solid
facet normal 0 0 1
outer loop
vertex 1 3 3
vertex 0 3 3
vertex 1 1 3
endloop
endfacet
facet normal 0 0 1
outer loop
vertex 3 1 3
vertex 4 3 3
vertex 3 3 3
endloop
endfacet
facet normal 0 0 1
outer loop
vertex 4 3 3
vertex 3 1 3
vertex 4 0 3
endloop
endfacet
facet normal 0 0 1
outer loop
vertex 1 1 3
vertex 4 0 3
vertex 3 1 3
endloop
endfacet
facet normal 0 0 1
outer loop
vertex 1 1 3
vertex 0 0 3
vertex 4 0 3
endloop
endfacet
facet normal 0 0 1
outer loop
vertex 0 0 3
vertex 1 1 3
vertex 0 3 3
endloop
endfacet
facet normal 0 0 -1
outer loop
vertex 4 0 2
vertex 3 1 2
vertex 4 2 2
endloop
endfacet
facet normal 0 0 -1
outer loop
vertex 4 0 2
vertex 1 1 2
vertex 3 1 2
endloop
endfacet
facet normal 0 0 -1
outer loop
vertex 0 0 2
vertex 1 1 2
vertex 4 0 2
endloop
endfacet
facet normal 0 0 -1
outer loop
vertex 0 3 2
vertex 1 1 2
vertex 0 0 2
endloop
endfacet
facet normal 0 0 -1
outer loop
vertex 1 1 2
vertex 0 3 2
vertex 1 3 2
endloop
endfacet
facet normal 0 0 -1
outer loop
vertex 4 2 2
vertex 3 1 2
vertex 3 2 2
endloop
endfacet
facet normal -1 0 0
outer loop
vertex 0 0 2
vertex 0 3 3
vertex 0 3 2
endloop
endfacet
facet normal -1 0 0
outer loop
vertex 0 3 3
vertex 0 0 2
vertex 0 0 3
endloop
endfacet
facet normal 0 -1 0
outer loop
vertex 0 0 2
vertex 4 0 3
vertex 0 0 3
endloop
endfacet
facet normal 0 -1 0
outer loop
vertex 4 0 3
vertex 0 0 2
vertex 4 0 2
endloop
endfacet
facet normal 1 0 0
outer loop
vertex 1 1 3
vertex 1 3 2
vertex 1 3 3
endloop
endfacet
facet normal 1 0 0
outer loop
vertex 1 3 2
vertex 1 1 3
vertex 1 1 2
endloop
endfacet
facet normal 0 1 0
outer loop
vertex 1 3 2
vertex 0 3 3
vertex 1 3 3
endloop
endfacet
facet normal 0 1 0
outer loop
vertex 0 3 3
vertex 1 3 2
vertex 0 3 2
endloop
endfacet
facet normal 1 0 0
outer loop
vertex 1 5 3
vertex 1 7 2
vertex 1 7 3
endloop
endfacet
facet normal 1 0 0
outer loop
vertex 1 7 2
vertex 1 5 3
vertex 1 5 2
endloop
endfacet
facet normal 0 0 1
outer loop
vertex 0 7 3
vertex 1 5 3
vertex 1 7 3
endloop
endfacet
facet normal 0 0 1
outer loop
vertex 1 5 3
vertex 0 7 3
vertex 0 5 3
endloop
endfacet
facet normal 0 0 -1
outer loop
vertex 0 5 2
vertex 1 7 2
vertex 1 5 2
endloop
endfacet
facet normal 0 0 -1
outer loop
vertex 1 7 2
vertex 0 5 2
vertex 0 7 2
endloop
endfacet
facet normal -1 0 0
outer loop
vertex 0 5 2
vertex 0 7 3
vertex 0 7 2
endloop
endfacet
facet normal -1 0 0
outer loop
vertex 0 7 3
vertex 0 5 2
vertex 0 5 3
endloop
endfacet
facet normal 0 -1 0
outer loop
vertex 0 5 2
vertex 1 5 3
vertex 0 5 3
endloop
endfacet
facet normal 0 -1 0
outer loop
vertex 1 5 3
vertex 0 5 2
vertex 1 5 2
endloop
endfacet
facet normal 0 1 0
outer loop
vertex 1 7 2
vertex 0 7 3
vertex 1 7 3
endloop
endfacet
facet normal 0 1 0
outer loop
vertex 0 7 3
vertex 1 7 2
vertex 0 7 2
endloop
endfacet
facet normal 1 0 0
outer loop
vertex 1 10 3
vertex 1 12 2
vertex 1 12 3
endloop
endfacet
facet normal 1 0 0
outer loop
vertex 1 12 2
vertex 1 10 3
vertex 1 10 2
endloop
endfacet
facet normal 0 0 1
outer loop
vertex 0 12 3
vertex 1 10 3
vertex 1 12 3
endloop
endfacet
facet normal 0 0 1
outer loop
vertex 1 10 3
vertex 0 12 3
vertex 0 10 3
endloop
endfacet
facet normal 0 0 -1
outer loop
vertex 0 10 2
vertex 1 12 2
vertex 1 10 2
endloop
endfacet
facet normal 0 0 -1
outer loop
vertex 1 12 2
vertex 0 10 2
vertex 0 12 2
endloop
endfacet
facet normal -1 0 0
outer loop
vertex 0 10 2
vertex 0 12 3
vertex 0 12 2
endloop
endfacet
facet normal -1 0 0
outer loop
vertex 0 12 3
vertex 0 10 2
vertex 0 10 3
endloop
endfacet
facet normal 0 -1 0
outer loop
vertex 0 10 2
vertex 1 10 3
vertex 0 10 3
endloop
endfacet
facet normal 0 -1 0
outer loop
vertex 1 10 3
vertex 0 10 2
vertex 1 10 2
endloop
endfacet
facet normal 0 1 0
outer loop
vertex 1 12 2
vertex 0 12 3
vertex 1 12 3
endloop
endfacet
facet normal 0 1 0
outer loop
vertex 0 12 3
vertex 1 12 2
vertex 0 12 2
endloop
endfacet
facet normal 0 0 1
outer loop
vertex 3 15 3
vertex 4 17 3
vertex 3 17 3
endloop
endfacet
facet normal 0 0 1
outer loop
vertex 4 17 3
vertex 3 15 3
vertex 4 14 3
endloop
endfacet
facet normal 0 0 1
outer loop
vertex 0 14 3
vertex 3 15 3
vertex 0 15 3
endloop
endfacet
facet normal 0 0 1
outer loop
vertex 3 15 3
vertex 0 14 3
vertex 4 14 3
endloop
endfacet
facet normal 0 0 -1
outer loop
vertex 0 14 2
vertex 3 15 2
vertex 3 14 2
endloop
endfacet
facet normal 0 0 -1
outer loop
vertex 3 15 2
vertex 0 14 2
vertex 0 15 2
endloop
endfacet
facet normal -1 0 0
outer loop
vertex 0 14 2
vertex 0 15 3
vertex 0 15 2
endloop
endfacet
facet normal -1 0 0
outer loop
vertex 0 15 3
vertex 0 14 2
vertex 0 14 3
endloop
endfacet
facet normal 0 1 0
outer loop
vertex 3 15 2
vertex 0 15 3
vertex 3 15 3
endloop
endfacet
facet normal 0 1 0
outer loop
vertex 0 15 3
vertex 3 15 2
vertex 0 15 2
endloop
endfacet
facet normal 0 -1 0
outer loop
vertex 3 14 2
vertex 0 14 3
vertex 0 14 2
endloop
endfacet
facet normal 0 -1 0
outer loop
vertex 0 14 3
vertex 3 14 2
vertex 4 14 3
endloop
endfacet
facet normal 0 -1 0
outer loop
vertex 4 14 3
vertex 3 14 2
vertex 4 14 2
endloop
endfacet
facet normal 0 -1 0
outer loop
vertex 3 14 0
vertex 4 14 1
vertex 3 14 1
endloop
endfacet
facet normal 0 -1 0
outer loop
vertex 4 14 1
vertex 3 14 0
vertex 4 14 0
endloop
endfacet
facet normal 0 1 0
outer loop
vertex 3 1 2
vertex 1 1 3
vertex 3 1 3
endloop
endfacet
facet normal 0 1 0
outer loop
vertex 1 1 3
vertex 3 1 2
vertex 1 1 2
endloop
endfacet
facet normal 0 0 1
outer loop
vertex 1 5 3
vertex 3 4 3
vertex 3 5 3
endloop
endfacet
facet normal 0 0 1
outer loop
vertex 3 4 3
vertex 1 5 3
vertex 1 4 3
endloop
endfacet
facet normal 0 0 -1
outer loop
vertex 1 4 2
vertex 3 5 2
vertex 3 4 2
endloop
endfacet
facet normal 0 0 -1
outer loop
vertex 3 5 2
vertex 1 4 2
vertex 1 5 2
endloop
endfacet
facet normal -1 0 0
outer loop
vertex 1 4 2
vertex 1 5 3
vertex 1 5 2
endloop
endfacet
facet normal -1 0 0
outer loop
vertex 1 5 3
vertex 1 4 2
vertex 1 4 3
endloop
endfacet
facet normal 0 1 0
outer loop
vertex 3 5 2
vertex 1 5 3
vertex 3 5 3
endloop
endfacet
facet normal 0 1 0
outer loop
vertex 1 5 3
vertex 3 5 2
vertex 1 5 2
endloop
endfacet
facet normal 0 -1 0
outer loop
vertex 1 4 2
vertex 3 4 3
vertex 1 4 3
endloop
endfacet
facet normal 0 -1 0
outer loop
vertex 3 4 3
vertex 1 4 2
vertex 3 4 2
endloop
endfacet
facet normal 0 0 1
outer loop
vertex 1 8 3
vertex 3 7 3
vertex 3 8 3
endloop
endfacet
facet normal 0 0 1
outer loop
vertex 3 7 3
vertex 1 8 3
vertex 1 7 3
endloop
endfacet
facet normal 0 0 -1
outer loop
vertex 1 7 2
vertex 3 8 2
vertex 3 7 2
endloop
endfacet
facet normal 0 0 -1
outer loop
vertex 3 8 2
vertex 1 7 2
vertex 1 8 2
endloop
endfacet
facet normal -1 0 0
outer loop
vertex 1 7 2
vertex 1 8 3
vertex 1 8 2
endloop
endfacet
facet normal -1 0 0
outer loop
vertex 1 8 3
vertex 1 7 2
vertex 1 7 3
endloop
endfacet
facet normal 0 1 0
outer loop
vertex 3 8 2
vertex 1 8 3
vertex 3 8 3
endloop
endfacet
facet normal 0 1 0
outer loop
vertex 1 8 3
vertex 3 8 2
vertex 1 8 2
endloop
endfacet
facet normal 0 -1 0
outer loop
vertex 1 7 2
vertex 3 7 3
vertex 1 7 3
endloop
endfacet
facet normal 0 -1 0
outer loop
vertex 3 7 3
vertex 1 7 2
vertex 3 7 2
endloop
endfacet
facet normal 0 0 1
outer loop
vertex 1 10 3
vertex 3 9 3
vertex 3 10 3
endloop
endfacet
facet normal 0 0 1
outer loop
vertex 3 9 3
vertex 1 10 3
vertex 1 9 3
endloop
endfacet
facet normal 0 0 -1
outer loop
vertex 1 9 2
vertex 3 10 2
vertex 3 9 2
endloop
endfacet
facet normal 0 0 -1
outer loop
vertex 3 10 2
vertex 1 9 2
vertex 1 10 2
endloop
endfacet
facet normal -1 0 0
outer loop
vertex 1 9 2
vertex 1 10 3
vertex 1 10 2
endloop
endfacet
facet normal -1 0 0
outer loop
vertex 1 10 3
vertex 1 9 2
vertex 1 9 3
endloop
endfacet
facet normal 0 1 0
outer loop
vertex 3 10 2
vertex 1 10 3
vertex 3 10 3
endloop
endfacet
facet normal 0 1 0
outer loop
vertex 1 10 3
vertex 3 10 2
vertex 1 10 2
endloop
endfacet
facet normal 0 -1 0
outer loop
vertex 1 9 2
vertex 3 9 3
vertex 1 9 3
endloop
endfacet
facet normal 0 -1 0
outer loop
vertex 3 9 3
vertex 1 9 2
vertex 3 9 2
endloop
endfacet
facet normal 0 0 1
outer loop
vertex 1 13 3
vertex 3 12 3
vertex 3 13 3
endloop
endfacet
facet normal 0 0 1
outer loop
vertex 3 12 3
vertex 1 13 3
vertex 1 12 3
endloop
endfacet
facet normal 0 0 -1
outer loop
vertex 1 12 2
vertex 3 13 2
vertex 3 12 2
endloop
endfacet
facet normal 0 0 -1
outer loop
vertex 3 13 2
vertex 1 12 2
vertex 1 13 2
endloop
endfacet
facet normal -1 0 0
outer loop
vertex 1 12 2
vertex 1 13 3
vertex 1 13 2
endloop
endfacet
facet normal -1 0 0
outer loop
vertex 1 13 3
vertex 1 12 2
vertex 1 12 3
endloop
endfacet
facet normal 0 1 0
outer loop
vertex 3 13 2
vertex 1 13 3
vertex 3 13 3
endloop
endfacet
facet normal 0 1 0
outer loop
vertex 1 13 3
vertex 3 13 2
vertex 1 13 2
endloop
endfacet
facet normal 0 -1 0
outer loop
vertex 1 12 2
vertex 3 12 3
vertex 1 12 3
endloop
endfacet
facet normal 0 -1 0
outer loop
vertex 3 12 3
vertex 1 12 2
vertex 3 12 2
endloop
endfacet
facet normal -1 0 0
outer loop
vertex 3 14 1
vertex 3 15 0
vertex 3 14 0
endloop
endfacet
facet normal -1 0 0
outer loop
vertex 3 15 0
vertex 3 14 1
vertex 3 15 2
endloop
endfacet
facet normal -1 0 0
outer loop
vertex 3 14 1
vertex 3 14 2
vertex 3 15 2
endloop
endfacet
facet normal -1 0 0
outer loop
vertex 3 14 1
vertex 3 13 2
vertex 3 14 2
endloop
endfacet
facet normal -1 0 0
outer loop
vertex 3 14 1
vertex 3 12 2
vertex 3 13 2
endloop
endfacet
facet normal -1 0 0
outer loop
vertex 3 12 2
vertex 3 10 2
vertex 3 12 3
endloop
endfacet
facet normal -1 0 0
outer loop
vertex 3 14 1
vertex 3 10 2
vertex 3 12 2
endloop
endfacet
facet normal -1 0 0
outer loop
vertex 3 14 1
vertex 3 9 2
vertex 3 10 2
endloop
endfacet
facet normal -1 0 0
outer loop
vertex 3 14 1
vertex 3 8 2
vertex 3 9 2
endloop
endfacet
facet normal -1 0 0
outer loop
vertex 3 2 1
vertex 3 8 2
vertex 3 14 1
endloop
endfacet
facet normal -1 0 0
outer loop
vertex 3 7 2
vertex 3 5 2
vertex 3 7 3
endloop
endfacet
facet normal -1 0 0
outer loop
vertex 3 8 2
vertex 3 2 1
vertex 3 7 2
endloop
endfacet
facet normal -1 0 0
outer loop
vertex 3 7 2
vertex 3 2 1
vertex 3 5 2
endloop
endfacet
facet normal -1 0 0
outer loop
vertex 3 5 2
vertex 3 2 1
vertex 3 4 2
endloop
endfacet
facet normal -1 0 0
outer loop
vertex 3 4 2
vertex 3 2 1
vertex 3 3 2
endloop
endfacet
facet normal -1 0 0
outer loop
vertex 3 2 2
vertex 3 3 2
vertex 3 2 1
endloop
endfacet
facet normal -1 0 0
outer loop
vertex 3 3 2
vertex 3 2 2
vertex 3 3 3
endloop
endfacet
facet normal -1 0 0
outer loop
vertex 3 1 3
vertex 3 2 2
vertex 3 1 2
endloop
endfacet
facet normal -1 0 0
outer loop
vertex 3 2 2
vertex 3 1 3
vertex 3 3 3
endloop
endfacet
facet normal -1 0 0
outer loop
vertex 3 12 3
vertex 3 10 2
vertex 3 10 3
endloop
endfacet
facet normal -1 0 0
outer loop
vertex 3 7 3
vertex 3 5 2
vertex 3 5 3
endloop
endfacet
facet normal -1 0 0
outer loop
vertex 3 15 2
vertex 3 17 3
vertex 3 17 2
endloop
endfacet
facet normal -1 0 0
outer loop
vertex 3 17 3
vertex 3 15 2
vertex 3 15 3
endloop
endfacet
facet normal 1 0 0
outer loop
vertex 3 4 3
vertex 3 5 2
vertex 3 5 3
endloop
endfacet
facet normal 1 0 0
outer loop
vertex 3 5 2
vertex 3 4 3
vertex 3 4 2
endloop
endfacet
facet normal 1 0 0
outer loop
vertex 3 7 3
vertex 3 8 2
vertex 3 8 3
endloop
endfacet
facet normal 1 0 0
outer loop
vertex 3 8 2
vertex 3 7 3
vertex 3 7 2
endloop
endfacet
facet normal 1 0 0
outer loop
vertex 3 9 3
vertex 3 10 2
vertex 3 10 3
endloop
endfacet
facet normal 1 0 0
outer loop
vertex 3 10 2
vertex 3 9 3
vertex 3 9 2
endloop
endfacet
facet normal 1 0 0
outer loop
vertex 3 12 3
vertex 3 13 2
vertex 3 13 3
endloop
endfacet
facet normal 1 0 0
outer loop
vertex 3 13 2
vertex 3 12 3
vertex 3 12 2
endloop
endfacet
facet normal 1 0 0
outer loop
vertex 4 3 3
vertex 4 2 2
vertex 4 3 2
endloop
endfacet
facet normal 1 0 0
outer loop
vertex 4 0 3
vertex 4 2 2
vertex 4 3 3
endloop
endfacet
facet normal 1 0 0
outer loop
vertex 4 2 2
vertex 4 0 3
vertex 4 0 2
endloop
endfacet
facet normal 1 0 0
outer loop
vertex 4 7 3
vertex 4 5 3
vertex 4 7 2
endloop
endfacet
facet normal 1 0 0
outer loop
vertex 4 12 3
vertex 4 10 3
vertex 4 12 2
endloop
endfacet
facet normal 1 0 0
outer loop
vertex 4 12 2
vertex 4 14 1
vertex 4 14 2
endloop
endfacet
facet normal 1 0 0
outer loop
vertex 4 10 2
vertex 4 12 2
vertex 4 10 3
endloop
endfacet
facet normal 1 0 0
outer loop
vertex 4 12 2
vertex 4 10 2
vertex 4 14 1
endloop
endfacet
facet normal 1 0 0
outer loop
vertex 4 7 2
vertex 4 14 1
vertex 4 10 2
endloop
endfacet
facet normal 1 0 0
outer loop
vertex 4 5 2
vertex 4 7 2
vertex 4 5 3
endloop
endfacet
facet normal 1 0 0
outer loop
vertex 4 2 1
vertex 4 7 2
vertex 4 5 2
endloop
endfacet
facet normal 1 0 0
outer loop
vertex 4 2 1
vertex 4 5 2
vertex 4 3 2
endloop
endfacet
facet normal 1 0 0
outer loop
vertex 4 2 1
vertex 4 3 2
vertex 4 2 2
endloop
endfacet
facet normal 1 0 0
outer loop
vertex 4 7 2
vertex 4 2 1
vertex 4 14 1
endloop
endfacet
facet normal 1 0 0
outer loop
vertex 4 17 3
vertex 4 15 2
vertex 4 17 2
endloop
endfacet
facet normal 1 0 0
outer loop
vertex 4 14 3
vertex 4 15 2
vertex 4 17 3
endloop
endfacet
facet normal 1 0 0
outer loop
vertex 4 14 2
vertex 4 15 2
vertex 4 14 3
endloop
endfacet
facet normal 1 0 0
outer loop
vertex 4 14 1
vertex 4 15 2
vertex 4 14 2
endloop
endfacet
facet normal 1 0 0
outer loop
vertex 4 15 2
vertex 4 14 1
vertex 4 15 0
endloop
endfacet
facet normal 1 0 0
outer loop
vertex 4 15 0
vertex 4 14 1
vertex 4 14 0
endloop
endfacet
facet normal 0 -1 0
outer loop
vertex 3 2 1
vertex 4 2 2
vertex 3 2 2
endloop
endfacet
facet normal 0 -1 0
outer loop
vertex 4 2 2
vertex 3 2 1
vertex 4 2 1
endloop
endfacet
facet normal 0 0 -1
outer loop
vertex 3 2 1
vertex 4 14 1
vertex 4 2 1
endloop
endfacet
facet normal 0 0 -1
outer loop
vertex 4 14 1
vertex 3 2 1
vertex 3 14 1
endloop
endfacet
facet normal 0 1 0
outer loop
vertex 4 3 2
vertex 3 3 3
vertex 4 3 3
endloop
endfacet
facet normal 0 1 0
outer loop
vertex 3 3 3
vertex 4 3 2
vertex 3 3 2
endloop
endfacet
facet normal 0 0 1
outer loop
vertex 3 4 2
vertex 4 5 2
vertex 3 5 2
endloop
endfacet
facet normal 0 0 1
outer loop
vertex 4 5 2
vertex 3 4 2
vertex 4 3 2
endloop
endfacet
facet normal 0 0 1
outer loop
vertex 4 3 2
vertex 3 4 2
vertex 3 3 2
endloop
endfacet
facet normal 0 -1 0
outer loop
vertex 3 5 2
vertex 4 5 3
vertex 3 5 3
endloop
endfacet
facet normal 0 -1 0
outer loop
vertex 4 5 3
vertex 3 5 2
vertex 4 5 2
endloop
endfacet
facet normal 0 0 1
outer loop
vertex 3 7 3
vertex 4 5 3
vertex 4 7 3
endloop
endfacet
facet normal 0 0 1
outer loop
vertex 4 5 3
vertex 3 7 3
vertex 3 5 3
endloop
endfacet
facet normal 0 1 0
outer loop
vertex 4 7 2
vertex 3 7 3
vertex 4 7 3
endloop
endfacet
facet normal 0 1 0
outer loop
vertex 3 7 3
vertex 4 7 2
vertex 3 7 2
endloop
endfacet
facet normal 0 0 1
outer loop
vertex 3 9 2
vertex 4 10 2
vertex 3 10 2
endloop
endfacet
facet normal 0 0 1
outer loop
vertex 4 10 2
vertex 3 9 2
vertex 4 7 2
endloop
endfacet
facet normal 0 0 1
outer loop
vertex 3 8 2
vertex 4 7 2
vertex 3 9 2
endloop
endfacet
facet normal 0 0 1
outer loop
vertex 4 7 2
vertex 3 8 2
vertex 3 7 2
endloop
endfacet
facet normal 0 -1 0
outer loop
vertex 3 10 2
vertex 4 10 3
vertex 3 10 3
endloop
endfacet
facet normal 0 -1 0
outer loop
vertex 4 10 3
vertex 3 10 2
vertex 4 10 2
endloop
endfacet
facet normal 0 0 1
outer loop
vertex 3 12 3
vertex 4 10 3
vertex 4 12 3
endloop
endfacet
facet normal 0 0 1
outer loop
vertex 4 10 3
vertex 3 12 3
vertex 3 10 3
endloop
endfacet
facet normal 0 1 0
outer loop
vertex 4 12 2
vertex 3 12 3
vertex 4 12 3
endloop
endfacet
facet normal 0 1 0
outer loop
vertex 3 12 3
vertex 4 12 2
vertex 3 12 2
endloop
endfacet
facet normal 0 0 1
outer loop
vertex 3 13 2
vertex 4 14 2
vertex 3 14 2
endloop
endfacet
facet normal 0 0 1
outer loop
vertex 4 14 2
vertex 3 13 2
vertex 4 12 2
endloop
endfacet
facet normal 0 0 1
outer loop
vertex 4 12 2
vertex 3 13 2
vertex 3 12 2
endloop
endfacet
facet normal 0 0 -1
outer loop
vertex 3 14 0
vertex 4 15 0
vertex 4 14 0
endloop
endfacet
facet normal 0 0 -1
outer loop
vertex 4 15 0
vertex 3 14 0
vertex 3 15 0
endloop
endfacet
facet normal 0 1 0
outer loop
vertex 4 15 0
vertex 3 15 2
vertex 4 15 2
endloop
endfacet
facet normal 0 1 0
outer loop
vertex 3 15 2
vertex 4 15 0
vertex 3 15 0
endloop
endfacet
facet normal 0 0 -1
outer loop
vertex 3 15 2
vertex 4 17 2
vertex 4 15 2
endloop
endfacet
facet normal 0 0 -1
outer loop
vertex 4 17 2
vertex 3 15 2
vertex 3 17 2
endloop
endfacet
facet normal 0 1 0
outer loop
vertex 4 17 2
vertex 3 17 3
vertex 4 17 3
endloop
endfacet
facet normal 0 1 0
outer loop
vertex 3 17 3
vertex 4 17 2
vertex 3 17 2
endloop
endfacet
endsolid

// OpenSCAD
union () { 
translate([0,0,2]) cube([1,1,1]);
translate([0,1,2]) cube([1,1,1]);
translate([0,2,2]) cube([1,1,1]);
translate([0,5,2]) cube([1,1,1]);
translate([0,6,2]) cube([1,1,1]);
translate([0,10,2]) cube([1,1,1]);
translate([0,11,2]) cube([1,1,1]);
translate([0,14,2]) cube([1,1,1]);
translate([1,0,2]) cube([1,1,1]);
translate([1,4,2]) cube([1,1,1]);
translate([1,7,2]) cube([1,1,1]);
translate([1,9,2]) cube([1,1,1]);
translate([1,12,2]) cube([1,1,1]);
translate([1,14,2]) cube([1,1,1]);
translate([2,0,2]) cube([1,1,1]);
translate([2,4,2]) cube([1,1,1]);
translate([2,7,2]) cube([1,1,1]);
translate([2,9,2]) cube([1,1,1]);
translate([2,12,2]) cube([1,1,1]);
translate([2,14,2]) cube([1,1,1]);
translate([3,0,2]) cube([1,1,1]);
translate([3,1,2]) cube([1,1,1]);
translate([3,2,1]) cube([1,1,2]);
translate([3,3,1]) cube([1,1,1]);
translate([3,4,1]) cube([1,1,1]);
translate([3,5,1]) cube([1,1,2]);
translate([3,6,1]) cube([1,1,2]);
translate([3,7,1]) cube([1,1,1]);
translate([3,8,1]) cube([1,1,1]);
translate([3,9,1]) cube([1,1,1]);
translate([3,10,1]) cube([1,1,2]);
translate([3,11,1]) cube([1,1,2]);
translate([3,12,1]) cube([1,1,1]);
translate([3,13,1]) cube([1,1,1]);
translate([3,14,0]) cube([1,1,3]);
translate([3,15,2]) cube([1,1,1]);
translate([3,16,2]) cube([1,1,1]);
}
